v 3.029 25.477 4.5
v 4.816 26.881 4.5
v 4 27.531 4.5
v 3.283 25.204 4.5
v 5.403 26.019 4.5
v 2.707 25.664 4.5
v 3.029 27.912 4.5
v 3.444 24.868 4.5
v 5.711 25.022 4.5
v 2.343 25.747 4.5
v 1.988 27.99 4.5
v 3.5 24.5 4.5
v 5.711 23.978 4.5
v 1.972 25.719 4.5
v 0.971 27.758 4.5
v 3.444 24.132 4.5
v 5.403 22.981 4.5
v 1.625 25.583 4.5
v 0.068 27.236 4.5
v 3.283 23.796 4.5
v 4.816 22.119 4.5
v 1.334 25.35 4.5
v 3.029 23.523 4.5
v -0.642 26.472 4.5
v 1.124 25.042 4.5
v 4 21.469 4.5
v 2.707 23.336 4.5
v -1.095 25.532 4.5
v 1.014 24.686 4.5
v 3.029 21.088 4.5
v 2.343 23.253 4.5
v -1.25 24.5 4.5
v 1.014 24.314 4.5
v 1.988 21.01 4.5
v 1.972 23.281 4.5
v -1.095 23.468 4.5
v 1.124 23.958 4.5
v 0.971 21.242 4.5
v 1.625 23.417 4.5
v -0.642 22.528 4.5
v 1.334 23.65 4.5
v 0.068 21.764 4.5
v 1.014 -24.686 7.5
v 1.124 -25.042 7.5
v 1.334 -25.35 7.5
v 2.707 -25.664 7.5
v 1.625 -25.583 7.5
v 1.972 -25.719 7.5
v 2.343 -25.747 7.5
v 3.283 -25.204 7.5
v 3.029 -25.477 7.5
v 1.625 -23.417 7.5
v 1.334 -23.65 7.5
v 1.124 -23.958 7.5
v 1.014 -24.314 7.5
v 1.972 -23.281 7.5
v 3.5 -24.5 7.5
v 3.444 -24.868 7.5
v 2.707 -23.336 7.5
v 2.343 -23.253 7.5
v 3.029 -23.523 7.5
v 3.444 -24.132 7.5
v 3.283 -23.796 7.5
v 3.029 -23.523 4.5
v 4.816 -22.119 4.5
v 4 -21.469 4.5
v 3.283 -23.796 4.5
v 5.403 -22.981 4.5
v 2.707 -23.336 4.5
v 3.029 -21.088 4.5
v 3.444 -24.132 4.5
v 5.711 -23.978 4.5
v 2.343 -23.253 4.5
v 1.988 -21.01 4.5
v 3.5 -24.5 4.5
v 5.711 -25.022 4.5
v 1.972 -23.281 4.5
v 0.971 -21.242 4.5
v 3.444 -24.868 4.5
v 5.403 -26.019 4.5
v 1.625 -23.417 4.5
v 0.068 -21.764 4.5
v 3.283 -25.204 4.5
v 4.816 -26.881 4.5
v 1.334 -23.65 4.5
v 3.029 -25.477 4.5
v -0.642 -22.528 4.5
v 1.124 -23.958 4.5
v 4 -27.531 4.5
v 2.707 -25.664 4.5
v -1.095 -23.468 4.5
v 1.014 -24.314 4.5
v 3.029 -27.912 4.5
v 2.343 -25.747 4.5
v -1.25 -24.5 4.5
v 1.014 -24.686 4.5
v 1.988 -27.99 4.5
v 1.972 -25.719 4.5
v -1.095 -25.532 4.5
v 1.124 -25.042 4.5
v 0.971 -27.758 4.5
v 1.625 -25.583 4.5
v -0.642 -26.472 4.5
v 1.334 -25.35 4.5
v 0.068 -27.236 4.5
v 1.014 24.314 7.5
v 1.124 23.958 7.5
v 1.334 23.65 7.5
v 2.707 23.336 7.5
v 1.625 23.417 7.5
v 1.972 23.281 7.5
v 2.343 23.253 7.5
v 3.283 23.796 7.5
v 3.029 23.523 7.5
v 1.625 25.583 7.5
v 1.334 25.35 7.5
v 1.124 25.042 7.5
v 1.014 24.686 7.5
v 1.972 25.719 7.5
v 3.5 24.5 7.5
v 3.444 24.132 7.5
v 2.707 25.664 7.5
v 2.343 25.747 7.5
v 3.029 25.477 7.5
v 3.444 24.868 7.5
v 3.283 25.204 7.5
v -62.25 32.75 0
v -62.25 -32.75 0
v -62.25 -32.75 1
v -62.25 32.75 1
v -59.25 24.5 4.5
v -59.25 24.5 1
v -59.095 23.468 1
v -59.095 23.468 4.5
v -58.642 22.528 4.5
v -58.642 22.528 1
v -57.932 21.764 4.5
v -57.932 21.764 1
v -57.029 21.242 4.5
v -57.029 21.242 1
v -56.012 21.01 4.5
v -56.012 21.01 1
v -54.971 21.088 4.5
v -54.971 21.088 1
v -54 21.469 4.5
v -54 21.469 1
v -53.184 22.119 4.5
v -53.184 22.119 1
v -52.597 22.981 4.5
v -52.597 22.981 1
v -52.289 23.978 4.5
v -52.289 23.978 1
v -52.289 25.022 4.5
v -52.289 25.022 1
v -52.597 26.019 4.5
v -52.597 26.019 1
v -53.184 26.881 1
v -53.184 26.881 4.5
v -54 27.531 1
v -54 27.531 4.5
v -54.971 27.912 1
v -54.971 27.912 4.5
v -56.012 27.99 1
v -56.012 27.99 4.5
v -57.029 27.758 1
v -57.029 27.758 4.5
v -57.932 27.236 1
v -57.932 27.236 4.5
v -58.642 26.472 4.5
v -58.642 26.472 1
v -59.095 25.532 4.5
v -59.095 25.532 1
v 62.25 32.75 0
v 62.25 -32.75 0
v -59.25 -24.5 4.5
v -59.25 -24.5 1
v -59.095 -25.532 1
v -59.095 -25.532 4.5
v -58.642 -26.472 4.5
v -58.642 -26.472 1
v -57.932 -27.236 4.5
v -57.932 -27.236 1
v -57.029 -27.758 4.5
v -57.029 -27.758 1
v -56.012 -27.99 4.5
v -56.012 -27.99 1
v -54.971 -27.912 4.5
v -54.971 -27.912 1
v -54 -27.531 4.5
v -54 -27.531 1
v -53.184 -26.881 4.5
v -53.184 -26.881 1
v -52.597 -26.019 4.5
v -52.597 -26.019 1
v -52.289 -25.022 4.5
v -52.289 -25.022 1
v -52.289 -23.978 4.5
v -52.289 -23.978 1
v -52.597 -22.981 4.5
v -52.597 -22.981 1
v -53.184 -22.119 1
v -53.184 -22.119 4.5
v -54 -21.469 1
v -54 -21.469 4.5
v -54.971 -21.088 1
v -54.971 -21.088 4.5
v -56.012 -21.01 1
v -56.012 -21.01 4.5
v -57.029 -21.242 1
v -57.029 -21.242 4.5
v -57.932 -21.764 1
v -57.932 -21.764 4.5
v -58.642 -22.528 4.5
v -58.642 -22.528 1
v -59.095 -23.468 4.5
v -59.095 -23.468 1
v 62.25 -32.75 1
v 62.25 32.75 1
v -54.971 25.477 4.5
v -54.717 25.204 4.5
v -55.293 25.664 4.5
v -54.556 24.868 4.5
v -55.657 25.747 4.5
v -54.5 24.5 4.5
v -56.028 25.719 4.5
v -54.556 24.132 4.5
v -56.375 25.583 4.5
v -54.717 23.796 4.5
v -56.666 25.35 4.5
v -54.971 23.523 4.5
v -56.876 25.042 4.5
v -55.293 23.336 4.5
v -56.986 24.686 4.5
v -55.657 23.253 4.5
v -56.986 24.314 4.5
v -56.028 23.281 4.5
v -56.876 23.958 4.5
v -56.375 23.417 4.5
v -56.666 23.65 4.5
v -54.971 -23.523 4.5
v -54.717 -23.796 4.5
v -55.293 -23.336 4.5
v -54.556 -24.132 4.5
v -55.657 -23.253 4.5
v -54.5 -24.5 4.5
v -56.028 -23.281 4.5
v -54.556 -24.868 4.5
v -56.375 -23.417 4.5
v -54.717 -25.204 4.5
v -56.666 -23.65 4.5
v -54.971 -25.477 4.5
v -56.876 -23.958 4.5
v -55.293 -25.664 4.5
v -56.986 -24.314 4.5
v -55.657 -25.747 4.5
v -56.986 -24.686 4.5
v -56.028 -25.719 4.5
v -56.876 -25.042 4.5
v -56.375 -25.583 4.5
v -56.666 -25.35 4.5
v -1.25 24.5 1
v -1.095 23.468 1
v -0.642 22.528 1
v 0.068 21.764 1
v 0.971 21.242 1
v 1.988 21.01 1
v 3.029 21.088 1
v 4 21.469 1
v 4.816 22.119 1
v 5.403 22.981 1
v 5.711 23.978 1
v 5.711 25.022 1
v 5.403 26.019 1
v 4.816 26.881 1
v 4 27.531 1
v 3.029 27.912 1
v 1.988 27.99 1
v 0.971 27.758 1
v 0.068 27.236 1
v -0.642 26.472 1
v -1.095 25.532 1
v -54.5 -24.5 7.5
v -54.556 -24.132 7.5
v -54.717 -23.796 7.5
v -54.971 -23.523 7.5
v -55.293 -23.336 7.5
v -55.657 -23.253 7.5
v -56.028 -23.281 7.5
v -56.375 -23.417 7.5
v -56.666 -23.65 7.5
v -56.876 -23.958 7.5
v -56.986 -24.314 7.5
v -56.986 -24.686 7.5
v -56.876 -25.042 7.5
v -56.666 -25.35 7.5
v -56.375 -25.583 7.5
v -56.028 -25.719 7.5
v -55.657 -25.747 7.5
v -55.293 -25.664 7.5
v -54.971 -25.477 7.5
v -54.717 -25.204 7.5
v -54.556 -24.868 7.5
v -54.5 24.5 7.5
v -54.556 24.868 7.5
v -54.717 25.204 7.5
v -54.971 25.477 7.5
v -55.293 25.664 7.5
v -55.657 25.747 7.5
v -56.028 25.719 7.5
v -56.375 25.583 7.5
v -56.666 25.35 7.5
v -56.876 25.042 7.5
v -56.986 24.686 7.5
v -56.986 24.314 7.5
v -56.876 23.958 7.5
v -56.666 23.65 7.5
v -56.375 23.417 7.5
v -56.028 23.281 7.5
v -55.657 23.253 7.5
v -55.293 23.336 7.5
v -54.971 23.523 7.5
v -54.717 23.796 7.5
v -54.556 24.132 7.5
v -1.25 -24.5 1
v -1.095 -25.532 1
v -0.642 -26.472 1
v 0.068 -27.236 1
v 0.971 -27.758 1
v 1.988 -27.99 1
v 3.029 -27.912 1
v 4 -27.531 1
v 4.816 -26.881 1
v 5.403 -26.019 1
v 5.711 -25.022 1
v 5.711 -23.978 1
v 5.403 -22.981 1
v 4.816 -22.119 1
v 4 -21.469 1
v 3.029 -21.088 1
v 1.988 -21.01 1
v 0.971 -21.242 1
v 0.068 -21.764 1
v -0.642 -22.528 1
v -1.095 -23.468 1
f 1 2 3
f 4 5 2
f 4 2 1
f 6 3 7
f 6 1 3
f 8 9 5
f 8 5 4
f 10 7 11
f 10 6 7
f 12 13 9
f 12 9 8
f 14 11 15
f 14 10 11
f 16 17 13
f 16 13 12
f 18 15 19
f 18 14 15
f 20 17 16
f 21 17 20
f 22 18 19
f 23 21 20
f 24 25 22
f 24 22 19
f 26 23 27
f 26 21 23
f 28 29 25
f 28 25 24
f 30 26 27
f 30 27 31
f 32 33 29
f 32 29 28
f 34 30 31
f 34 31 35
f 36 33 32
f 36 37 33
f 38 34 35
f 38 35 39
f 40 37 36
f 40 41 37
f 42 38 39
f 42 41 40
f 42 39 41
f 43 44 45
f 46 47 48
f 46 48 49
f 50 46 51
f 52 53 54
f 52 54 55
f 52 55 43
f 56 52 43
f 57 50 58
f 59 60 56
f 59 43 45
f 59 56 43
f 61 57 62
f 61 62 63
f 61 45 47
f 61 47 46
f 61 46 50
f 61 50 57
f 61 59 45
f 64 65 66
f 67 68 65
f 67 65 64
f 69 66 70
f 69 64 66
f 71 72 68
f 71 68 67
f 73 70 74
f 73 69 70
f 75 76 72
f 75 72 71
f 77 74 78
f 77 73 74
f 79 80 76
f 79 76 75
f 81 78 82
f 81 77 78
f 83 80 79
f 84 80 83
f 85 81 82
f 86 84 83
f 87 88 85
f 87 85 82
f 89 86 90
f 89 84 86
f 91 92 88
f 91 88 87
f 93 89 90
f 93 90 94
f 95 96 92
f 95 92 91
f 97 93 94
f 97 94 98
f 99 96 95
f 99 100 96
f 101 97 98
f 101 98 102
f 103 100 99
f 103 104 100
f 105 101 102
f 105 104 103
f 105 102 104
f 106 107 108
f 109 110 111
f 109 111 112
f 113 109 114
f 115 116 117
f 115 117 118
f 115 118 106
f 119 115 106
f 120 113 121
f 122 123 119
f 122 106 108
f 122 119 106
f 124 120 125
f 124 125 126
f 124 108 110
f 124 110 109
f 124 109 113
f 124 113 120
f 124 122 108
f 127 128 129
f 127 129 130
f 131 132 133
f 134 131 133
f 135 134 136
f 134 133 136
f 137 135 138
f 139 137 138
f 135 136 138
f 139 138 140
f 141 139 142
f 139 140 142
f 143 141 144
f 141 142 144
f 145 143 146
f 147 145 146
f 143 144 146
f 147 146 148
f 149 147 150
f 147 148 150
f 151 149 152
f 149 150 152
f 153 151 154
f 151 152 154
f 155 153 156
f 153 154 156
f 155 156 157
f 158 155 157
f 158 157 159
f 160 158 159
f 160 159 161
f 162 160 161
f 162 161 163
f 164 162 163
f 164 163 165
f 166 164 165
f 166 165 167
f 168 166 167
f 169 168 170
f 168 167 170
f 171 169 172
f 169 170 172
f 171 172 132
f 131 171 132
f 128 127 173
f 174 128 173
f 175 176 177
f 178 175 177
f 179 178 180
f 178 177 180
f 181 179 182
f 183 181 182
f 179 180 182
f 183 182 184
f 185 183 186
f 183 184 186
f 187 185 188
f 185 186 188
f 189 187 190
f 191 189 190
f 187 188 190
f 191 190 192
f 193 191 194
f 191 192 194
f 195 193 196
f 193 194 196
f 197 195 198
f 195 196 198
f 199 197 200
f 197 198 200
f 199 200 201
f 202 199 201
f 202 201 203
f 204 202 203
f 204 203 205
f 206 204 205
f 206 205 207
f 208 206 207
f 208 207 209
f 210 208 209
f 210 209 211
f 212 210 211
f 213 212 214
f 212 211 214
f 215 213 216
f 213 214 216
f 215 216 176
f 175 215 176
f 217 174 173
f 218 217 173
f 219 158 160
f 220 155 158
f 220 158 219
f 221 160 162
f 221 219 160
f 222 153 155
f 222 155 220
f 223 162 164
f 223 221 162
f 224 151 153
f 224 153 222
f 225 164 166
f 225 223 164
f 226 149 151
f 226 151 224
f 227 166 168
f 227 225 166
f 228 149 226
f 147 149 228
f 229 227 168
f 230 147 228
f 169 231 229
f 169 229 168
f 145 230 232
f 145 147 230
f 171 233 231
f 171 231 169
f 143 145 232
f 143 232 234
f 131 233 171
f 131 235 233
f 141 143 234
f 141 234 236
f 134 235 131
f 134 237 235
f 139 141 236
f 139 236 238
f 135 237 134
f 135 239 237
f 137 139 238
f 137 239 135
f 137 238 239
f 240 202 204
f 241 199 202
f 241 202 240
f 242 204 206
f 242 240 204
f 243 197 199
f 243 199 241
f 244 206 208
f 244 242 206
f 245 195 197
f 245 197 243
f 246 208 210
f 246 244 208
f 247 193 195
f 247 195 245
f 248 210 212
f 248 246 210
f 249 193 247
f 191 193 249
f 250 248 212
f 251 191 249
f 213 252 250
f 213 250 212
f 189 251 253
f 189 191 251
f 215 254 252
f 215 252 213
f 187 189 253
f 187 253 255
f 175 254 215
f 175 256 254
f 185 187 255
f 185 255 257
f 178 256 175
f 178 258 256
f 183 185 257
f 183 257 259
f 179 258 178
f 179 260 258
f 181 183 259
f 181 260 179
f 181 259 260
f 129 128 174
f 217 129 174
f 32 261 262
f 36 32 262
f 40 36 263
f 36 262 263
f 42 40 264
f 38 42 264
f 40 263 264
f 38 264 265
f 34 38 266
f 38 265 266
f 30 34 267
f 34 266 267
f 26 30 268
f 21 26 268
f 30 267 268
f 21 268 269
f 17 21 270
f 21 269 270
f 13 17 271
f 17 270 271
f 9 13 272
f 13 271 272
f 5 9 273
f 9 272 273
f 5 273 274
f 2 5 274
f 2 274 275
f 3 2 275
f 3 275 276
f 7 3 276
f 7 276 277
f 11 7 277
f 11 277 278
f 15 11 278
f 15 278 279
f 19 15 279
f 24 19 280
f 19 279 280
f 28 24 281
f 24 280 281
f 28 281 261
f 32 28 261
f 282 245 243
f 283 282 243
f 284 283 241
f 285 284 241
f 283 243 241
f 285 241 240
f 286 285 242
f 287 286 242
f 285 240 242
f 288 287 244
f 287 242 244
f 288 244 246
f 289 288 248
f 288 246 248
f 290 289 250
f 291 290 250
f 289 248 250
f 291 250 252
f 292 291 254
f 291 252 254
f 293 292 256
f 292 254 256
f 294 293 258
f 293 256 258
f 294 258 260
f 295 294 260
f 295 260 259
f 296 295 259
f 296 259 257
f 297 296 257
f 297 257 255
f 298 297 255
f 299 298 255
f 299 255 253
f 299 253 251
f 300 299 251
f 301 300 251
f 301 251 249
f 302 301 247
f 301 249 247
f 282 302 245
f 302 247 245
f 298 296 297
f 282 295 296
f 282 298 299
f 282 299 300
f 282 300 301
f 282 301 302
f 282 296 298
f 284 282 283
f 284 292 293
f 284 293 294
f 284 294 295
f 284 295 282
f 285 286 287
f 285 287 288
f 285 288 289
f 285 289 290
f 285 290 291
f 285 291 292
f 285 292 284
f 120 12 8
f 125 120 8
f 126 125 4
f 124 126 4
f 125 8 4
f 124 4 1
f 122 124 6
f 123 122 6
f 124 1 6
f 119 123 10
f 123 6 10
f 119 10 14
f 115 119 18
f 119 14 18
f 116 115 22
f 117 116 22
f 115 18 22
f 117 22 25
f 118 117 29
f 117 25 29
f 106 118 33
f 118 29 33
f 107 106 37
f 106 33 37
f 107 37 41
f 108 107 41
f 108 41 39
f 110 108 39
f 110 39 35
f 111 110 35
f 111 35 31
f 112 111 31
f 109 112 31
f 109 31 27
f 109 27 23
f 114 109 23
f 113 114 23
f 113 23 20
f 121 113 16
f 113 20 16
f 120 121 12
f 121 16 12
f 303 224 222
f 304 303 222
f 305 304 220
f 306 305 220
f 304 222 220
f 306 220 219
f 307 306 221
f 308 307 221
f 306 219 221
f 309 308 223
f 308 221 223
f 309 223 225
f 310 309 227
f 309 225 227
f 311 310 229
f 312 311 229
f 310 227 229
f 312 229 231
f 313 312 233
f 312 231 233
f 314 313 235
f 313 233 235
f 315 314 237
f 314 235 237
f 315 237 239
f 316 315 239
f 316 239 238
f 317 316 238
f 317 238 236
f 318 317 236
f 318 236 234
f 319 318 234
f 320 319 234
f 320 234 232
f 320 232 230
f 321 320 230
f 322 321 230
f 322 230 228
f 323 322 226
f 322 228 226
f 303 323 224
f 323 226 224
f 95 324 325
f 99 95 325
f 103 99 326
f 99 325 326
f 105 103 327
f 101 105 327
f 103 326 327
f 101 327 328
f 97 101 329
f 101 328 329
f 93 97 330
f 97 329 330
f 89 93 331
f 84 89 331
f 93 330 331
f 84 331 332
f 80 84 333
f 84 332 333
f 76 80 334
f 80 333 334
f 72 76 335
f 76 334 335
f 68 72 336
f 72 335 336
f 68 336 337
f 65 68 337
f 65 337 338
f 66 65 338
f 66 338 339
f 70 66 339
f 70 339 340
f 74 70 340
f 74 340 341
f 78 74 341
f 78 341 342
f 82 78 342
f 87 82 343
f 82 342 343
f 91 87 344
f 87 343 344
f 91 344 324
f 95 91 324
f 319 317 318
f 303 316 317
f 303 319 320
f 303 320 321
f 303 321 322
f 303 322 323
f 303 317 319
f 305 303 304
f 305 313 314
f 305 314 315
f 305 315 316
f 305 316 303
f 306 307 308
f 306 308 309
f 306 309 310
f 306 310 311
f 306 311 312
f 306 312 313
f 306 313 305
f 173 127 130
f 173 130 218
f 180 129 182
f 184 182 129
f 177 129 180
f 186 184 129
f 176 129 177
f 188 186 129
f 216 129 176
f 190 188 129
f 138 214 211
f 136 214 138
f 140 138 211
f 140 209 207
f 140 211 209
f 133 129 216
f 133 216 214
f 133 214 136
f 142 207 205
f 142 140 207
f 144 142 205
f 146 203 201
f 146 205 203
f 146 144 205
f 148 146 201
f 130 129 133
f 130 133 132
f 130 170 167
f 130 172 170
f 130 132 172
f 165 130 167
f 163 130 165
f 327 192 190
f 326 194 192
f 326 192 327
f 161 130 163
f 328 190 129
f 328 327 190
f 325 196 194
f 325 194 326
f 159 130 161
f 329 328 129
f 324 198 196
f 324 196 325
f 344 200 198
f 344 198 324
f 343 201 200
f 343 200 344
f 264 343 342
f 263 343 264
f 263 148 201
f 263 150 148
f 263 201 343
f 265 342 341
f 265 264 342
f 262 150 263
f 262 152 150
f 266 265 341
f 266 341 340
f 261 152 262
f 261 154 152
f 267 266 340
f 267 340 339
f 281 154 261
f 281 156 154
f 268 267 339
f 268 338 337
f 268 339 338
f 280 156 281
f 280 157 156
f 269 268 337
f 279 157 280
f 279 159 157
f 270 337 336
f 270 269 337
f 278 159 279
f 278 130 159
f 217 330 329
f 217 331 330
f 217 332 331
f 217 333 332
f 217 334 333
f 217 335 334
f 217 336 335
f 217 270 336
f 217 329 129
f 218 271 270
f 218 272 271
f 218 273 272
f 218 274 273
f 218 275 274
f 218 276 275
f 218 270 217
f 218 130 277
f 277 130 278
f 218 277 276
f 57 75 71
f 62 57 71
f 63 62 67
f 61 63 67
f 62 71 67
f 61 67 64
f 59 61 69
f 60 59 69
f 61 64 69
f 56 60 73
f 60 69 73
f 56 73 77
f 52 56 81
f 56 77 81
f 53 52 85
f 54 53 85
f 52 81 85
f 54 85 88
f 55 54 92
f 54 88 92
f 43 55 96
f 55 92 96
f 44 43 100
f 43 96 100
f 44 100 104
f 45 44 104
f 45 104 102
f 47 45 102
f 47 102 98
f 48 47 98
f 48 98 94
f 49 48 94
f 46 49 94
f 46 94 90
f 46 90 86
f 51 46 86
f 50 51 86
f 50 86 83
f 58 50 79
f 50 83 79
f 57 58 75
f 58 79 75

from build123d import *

# Parameters (mm, degrees)
SKETCH1_W           = 124.5
SKETCH1_H           = 65.5
BOSS_EXTRUDE1_DEPTH = 1
SKETCH2_R           = 3.5
BOSS_EXTRUDE2_DEPTH = 3.5
SKETCH3_R           = 1.25
BOSS_EXTRUDE3_DEPTH = 3


with BuildPart() as part:
    # Sketch1 → Boss-Extrude1 (new body)
    with BuildSketch(Plane.XY):
        Rectangle(SKETCH1_W, SKETCH1_H)
    extrude(amount=BOSS_EXTRUDE1_DEPTH)

    # Sketch2 → Boss-Extrude2 (add)
    with BuildSketch(Plane.XY.offset(1)):
        with Locations(Location((-55.75, 24.5, 0), (0, 0, 180))):
            Circle(SKETCH2_R)
        with Locations(Location((2.25, 24.5, 0), (0, 0, 180))):
            Circle(SKETCH2_R)
        with Locations(Location((2.25, -24.5, 0), (0, 0, 180))):
            Circle(SKETCH2_R)
        with Locations(Location((-55.75, -24.5, 0), (0, 0, 180))):
            Circle(SKETCH2_R)
    extrude(amount=BOSS_EXTRUDE2_DEPTH)

    # Sketch3 → Boss-Extrude3 (add)
    with BuildSketch(Plane.XY.offset(4.5)):
        with Locations((-55.75, 24.5)):
            Circle(SKETCH3_R)
        with Locations((2.25, 24.5)):
            Circle(SKETCH3_R)
        with Locations((2.25, -24.5)):
            Circle(SKETCH3_R)
        with Locations((-55.75, -24.5)):
            Circle(SKETCH3_R)
    extrude(amount=BOSS_EXTRUDE3_DEPTH)


solid = part.part
